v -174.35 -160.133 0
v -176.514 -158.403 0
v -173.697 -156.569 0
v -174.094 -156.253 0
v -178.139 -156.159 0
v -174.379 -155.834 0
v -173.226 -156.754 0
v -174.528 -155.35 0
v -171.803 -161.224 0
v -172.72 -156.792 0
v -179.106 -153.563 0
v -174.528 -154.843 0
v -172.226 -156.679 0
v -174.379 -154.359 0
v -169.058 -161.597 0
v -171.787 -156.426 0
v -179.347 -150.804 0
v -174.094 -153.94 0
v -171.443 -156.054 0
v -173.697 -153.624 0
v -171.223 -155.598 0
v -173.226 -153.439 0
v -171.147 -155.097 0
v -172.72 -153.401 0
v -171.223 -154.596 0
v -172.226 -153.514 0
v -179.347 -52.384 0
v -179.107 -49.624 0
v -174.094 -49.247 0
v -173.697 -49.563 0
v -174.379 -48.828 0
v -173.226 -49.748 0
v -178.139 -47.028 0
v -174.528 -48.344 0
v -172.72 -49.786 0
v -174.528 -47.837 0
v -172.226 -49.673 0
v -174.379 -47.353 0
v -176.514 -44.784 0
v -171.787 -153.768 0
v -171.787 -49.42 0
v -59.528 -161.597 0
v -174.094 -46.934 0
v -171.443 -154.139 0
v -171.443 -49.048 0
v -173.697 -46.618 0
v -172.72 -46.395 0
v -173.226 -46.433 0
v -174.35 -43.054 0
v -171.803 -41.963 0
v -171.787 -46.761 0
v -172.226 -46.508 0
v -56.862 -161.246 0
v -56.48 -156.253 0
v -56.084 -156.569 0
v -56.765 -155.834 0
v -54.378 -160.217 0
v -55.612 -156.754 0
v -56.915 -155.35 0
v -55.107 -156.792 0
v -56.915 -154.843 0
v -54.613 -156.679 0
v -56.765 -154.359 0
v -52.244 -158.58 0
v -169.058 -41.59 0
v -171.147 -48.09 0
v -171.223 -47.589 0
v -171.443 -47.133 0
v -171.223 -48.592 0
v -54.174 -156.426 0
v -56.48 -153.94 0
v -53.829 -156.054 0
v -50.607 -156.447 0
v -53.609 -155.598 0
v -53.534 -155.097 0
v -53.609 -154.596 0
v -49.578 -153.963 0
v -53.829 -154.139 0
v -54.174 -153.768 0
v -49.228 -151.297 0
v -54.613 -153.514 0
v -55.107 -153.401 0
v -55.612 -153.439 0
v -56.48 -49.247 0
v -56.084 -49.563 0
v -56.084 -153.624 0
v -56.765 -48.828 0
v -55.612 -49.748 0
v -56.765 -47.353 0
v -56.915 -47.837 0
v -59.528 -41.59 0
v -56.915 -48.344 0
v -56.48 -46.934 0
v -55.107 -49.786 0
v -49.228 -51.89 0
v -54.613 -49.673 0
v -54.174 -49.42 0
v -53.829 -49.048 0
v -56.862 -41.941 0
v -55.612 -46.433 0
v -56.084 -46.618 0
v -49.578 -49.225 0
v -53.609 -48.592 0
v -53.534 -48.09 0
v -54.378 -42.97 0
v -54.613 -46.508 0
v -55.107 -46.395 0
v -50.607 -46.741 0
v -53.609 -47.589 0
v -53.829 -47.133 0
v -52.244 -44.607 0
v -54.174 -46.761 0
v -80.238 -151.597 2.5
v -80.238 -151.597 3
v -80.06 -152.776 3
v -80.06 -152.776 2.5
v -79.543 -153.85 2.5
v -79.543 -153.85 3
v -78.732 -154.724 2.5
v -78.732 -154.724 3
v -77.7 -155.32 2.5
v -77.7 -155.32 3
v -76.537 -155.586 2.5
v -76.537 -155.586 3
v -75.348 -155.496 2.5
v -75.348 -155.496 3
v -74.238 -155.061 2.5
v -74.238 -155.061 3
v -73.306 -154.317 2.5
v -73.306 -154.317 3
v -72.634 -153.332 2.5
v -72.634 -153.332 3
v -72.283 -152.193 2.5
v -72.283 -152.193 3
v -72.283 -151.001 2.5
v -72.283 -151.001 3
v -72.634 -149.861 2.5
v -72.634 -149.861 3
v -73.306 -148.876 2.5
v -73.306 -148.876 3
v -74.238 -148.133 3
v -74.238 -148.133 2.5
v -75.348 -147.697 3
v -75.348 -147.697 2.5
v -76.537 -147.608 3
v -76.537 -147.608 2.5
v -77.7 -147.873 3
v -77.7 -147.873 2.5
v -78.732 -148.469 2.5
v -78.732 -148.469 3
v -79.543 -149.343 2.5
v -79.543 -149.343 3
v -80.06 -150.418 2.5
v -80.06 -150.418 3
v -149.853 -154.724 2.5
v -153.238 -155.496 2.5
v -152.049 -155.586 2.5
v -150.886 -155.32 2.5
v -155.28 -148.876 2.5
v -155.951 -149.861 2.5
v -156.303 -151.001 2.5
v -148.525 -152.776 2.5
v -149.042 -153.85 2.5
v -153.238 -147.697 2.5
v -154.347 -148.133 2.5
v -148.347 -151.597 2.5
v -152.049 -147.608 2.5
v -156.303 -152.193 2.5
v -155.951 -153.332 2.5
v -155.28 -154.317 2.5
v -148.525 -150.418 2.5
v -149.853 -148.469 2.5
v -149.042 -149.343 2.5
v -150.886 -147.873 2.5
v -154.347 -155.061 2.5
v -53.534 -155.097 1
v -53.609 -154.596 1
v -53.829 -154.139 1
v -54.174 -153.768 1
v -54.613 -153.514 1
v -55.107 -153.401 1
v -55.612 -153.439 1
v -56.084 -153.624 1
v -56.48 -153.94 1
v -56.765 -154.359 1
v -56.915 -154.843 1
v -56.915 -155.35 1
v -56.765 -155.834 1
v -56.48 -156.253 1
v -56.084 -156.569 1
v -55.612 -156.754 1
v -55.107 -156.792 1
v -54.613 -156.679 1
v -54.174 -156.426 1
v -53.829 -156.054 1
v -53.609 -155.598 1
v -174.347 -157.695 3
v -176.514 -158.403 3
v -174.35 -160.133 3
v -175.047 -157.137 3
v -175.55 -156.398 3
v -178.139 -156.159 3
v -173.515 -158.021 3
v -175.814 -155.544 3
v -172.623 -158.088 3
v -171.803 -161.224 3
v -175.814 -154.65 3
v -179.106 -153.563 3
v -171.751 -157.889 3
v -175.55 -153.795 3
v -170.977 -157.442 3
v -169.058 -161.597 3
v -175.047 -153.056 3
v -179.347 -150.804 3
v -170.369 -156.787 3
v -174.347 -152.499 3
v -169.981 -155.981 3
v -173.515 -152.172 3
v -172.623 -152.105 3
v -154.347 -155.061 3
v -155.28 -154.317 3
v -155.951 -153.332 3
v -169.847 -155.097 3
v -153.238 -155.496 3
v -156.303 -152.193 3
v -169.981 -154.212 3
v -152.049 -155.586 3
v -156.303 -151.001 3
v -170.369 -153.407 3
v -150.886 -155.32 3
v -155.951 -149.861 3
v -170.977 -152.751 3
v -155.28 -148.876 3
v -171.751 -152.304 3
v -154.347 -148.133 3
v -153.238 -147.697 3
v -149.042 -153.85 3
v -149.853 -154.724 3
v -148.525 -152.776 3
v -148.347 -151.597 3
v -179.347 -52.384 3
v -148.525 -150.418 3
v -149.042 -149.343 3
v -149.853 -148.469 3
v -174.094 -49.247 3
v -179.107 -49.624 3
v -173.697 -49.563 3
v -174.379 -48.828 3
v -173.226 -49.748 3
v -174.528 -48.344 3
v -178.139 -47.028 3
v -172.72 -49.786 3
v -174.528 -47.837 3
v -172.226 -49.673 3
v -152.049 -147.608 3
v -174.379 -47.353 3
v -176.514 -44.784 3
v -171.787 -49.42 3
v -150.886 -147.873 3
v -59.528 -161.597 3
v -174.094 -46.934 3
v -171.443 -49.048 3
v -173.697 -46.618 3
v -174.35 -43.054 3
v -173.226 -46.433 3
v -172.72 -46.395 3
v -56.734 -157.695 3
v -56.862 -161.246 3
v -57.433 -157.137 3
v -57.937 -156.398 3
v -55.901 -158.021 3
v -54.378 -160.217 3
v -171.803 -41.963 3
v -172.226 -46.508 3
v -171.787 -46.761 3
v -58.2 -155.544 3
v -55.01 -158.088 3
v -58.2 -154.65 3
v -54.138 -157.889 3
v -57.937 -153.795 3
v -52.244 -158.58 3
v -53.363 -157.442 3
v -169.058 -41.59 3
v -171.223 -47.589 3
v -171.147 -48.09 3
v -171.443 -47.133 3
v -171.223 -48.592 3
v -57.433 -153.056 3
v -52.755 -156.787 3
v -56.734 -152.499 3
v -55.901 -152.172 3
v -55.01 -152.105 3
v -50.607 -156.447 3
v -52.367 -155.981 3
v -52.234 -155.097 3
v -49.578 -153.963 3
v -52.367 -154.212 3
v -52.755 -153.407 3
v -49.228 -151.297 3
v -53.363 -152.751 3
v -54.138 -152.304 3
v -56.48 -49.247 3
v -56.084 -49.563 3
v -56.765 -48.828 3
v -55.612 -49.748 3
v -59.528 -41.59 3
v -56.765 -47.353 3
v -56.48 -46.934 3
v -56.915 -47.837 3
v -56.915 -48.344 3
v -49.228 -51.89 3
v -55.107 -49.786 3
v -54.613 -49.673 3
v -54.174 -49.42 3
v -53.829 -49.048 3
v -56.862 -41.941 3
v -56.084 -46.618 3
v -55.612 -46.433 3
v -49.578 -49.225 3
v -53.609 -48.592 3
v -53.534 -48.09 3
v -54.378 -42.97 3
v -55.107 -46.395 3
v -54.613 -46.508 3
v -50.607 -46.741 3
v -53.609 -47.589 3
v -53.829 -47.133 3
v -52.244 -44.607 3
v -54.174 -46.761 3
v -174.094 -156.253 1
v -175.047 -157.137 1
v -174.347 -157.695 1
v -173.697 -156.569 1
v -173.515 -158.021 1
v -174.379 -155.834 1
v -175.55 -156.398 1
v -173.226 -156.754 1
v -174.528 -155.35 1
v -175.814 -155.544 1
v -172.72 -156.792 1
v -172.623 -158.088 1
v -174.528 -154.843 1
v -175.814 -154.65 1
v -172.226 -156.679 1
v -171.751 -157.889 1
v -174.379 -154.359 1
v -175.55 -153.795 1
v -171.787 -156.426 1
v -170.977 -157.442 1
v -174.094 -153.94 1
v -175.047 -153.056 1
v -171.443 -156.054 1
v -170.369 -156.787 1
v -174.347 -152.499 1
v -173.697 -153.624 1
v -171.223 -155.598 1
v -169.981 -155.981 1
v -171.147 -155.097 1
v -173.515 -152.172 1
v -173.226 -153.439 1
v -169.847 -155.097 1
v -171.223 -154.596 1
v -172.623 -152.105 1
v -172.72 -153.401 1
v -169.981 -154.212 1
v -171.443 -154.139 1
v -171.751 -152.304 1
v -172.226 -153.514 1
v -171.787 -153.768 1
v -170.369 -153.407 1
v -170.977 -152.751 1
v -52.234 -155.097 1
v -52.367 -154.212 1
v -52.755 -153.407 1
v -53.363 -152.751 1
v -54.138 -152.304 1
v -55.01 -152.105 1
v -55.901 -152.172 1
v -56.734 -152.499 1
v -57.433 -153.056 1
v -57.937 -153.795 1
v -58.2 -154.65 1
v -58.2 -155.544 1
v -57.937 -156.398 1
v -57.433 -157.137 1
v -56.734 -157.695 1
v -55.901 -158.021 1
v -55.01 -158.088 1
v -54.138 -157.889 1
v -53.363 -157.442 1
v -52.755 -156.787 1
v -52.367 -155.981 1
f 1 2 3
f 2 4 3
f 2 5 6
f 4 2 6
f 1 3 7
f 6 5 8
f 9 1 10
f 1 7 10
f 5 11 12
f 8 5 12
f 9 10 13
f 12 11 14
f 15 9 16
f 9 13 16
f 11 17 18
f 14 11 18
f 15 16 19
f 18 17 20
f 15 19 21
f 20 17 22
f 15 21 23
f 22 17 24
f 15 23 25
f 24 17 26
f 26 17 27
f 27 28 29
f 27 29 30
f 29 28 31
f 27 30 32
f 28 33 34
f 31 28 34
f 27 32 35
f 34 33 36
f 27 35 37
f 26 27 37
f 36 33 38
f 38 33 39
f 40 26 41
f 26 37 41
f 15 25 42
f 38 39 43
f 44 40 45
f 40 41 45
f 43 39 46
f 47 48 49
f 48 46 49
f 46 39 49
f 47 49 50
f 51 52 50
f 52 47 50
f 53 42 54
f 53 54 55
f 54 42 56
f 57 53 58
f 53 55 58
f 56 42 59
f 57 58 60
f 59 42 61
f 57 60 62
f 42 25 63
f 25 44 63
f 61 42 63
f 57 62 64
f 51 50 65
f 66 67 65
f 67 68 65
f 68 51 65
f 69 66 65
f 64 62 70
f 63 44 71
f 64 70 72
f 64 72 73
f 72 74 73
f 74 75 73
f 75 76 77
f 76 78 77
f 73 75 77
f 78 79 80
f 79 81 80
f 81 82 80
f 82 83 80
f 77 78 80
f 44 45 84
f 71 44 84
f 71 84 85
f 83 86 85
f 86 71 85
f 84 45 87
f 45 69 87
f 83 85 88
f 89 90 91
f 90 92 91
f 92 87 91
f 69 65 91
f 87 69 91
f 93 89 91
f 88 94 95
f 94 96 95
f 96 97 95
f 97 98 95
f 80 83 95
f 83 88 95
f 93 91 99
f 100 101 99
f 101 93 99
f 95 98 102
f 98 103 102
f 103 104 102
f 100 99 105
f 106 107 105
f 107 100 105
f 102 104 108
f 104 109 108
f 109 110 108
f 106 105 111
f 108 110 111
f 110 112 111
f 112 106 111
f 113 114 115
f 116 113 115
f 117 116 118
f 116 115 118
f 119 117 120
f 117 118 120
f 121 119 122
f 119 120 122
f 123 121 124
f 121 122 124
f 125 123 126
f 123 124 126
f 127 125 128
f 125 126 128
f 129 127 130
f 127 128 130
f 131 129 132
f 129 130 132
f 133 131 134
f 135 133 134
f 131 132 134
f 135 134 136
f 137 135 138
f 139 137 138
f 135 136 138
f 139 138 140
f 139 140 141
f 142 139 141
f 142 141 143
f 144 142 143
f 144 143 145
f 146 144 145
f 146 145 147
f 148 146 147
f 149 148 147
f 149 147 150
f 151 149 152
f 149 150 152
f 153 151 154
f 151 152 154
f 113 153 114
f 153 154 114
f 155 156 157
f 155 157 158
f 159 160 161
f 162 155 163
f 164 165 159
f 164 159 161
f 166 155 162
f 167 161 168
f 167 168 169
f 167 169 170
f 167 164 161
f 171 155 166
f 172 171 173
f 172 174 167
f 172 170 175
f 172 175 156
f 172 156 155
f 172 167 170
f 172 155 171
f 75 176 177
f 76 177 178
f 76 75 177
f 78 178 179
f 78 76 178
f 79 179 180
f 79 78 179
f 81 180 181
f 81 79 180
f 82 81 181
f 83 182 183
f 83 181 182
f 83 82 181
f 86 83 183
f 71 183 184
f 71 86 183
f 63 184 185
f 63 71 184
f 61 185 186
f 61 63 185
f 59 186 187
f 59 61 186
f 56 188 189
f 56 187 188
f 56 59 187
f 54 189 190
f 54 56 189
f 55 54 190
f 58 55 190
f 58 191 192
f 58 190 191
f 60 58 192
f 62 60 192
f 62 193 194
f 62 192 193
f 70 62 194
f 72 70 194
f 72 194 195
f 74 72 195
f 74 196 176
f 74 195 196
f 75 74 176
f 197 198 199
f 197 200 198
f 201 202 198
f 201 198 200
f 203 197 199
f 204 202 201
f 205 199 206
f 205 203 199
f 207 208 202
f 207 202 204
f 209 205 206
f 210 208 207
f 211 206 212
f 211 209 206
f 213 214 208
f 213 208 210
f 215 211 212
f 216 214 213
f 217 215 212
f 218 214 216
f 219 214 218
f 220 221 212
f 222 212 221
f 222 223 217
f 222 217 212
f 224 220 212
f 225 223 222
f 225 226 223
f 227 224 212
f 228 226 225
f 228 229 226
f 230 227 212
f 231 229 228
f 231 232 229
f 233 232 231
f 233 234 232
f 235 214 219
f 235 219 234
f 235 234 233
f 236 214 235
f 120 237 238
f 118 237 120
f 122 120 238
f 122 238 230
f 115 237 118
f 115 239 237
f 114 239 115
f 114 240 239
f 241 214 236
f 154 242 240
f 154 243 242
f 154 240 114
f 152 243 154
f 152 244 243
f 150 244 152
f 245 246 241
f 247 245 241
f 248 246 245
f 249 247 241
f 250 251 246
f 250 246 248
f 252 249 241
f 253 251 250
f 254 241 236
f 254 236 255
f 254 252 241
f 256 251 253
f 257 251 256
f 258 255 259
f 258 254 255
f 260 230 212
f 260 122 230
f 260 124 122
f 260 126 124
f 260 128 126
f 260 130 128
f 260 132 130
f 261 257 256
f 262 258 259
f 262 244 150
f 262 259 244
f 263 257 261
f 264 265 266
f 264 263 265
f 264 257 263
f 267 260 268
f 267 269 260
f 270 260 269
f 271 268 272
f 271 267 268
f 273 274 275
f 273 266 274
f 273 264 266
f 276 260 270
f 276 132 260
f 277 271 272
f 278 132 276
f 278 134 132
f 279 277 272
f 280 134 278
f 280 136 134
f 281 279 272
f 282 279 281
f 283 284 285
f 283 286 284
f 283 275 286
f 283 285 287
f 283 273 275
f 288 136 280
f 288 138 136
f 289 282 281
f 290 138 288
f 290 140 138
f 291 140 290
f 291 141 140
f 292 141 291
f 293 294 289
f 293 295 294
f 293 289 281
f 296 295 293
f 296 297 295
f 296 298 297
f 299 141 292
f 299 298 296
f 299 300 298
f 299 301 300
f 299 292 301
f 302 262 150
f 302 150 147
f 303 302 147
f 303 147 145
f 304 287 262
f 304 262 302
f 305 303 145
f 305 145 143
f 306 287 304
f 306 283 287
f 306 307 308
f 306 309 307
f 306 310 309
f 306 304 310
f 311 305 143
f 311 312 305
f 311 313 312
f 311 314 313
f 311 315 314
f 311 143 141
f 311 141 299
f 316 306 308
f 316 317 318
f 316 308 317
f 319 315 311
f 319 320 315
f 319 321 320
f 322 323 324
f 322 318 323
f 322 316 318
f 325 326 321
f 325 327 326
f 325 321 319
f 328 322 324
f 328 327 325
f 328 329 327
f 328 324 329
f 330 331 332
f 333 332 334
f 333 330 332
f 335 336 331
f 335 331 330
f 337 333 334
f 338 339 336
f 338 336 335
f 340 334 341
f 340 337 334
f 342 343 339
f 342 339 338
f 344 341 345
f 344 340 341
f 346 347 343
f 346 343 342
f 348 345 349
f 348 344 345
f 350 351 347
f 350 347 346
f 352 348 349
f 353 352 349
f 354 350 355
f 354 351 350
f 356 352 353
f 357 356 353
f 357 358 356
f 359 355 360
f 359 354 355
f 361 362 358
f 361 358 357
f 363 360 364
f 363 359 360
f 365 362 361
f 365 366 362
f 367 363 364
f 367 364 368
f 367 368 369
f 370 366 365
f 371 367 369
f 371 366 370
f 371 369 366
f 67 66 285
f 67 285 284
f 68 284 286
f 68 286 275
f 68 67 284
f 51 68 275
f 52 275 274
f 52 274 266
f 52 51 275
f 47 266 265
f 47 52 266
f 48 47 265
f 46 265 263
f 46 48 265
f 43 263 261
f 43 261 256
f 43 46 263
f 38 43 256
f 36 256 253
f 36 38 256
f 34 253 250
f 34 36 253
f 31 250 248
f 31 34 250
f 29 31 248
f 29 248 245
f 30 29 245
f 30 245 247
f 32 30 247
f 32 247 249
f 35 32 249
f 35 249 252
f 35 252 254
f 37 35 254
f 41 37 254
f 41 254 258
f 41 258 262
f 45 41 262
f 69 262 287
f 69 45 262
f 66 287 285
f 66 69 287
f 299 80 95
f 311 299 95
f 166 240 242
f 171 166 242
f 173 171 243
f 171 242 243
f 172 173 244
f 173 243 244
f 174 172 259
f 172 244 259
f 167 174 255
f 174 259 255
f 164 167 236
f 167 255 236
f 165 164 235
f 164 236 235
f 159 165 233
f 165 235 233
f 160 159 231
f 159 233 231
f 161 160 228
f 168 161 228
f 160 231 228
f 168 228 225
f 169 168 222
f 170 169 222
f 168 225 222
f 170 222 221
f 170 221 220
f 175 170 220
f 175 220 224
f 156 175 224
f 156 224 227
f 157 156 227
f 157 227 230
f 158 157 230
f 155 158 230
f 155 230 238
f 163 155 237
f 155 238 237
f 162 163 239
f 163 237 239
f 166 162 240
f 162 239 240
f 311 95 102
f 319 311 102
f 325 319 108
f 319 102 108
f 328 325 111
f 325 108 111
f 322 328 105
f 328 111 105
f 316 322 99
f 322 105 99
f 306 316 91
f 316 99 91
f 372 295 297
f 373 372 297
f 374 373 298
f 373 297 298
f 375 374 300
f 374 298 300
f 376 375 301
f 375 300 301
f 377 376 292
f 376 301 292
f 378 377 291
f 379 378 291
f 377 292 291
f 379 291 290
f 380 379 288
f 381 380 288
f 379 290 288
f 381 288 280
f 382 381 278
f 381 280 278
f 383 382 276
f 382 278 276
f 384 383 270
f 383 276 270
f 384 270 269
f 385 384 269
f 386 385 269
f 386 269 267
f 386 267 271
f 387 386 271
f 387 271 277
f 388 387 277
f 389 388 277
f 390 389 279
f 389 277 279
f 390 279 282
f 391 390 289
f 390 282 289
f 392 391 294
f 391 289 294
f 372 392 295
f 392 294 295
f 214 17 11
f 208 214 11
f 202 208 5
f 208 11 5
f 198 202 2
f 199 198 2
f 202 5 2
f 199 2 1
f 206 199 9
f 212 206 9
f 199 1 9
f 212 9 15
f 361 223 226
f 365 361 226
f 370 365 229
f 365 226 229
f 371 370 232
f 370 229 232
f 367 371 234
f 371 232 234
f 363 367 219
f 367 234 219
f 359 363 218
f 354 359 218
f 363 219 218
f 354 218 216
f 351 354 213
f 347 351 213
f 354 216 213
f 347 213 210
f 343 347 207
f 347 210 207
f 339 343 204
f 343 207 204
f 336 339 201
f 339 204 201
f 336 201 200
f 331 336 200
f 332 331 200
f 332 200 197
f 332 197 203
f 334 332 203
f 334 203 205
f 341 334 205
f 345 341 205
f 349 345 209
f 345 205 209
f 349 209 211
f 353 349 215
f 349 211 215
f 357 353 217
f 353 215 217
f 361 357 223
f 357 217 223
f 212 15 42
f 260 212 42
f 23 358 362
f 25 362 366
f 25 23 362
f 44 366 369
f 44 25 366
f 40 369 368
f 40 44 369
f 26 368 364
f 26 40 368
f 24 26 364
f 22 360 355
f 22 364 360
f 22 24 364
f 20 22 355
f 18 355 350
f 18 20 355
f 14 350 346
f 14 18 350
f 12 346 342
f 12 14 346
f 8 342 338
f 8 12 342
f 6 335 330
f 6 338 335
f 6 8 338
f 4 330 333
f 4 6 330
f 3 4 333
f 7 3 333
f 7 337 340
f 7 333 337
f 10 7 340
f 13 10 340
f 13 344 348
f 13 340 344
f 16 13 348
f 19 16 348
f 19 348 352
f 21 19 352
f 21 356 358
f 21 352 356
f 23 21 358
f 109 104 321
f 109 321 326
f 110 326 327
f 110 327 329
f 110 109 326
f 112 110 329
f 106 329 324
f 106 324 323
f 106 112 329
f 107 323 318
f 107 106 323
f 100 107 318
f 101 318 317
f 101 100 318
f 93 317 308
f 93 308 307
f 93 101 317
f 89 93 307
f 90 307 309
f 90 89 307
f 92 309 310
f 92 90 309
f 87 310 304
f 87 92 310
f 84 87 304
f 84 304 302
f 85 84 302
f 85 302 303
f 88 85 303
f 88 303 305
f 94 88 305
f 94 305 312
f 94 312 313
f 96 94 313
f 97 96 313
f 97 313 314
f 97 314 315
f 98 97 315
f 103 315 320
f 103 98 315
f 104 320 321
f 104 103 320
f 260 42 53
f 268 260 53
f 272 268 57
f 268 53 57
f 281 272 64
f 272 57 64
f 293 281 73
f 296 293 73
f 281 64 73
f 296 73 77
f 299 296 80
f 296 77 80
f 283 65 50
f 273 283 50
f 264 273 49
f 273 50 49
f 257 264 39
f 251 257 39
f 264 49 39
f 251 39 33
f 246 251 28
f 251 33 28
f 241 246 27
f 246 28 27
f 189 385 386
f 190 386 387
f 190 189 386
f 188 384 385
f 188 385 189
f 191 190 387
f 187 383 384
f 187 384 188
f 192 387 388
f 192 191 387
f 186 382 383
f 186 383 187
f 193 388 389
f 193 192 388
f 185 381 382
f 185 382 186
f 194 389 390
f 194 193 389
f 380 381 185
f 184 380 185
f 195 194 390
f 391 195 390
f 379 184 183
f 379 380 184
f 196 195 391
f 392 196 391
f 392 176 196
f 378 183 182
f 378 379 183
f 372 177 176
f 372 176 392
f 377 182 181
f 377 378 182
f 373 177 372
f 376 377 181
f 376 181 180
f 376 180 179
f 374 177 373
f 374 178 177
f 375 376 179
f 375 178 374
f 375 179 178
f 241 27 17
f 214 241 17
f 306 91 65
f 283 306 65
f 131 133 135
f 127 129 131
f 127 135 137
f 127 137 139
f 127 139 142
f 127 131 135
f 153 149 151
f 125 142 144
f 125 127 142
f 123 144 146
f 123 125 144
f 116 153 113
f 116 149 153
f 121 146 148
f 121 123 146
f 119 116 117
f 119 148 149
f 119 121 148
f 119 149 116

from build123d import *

# Parameters (mm, degrees)
SKIZZE1_R                       = 1.7
AUFSATZ_LINEAR_AUSTRAGEN1_DEPTH = 3
SKIZZE2_R                       = 3
SCHNITT_LINEAR_AUSTRAGEN1_DEPTH = 2
SKIZZE3_R                       = 4
SCHNITT_LINEAR_AUSTRAGEN2_DEPTH = 0.5


with BuildPart() as part:
    # Skizze1 → Aufsatz-Linear austragen1 (new body)
    with BuildSketch(Plane.XY):
        with BuildLine():
            Line((-49.2275, -151.2967), (-49.2275, -51.8905))
            ThreePointArc((-49.2275, -51.8905), (-52.244300154, -44.607300154), (-59.5275, -41.5905))
            Line((-59.5275, -41.5905), (-169.0581, -41.5905))
            ThreePointArc((-169.0581, -41.5905), (-176.514207067, -44.783915623), (-179.34742314, -52.3842))
            Line((-179.34742314, -52.3842), (-179.34742314, -150.803560266))
            ThreePointArc((-179.34742314, -150.803560266), (-176.514004305, -158.403485592), (-169.0581, -161.5967))
            Line((-169.0581, -161.5967), (-59.5275, -161.5967))
            ThreePointArc((-59.5275, -161.5967), (-52.244300154, -158.579899846), (-49.2275, -151.2967))
        make_face()
        with Locations((-172.84742314, -155.0967)):
            Circle(SKIZZE1_R, mode=Mode.SUBTRACT)
        with Locations((-55.2338, -155.0967)):
            Circle(SKIZZE1_R, mode=Mode.SUBTRACT)
        with Locations((-55.2338, -48.0905)):
            Circle(SKIZZE1_R, mode=Mode.SUBTRACT)
        with Locations((-172.84742314, -48.0905)):
            Circle(SKIZZE1_R, mode=Mode.SUBTRACT)
    extrude(amount=AUFSATZ_LINEAR_AUSTRAGEN1_DEPTH)

    # Skizze2 → Schnitt-Linear austragen1 (cut)
    with BuildSketch(Plane.XY.offset(3)):
        with Locations((-172.84742314, -155.0967)):
            Circle(SKIZZE2_R)
        with Locations((-55.2338, -155.0967)):
            Circle(SKIZZE2_R)
    extrude(amount=-SCHNITT_LINEAR_AUSTRAGEN1_DEPTH, mode=Mode.SUBTRACT)

    # Skizze3 → Schnitt-Linear austragen2 (cut)
    with BuildSketch(Plane.XY.offset(3)):
        with Locations((-152.34742314, -151.5967)):
            Circle(SKIZZE3_R)
        with Locations(Location((-76.23817686, -151.5967, 0), (0, 0, 180))):
            Circle(SKIZZE3_R)
    extrude(amount=-SCHNITT_LINEAR_AUSTRAGEN2_DEPTH, mode=Mode.SUBTRACT)


solid = part.part
